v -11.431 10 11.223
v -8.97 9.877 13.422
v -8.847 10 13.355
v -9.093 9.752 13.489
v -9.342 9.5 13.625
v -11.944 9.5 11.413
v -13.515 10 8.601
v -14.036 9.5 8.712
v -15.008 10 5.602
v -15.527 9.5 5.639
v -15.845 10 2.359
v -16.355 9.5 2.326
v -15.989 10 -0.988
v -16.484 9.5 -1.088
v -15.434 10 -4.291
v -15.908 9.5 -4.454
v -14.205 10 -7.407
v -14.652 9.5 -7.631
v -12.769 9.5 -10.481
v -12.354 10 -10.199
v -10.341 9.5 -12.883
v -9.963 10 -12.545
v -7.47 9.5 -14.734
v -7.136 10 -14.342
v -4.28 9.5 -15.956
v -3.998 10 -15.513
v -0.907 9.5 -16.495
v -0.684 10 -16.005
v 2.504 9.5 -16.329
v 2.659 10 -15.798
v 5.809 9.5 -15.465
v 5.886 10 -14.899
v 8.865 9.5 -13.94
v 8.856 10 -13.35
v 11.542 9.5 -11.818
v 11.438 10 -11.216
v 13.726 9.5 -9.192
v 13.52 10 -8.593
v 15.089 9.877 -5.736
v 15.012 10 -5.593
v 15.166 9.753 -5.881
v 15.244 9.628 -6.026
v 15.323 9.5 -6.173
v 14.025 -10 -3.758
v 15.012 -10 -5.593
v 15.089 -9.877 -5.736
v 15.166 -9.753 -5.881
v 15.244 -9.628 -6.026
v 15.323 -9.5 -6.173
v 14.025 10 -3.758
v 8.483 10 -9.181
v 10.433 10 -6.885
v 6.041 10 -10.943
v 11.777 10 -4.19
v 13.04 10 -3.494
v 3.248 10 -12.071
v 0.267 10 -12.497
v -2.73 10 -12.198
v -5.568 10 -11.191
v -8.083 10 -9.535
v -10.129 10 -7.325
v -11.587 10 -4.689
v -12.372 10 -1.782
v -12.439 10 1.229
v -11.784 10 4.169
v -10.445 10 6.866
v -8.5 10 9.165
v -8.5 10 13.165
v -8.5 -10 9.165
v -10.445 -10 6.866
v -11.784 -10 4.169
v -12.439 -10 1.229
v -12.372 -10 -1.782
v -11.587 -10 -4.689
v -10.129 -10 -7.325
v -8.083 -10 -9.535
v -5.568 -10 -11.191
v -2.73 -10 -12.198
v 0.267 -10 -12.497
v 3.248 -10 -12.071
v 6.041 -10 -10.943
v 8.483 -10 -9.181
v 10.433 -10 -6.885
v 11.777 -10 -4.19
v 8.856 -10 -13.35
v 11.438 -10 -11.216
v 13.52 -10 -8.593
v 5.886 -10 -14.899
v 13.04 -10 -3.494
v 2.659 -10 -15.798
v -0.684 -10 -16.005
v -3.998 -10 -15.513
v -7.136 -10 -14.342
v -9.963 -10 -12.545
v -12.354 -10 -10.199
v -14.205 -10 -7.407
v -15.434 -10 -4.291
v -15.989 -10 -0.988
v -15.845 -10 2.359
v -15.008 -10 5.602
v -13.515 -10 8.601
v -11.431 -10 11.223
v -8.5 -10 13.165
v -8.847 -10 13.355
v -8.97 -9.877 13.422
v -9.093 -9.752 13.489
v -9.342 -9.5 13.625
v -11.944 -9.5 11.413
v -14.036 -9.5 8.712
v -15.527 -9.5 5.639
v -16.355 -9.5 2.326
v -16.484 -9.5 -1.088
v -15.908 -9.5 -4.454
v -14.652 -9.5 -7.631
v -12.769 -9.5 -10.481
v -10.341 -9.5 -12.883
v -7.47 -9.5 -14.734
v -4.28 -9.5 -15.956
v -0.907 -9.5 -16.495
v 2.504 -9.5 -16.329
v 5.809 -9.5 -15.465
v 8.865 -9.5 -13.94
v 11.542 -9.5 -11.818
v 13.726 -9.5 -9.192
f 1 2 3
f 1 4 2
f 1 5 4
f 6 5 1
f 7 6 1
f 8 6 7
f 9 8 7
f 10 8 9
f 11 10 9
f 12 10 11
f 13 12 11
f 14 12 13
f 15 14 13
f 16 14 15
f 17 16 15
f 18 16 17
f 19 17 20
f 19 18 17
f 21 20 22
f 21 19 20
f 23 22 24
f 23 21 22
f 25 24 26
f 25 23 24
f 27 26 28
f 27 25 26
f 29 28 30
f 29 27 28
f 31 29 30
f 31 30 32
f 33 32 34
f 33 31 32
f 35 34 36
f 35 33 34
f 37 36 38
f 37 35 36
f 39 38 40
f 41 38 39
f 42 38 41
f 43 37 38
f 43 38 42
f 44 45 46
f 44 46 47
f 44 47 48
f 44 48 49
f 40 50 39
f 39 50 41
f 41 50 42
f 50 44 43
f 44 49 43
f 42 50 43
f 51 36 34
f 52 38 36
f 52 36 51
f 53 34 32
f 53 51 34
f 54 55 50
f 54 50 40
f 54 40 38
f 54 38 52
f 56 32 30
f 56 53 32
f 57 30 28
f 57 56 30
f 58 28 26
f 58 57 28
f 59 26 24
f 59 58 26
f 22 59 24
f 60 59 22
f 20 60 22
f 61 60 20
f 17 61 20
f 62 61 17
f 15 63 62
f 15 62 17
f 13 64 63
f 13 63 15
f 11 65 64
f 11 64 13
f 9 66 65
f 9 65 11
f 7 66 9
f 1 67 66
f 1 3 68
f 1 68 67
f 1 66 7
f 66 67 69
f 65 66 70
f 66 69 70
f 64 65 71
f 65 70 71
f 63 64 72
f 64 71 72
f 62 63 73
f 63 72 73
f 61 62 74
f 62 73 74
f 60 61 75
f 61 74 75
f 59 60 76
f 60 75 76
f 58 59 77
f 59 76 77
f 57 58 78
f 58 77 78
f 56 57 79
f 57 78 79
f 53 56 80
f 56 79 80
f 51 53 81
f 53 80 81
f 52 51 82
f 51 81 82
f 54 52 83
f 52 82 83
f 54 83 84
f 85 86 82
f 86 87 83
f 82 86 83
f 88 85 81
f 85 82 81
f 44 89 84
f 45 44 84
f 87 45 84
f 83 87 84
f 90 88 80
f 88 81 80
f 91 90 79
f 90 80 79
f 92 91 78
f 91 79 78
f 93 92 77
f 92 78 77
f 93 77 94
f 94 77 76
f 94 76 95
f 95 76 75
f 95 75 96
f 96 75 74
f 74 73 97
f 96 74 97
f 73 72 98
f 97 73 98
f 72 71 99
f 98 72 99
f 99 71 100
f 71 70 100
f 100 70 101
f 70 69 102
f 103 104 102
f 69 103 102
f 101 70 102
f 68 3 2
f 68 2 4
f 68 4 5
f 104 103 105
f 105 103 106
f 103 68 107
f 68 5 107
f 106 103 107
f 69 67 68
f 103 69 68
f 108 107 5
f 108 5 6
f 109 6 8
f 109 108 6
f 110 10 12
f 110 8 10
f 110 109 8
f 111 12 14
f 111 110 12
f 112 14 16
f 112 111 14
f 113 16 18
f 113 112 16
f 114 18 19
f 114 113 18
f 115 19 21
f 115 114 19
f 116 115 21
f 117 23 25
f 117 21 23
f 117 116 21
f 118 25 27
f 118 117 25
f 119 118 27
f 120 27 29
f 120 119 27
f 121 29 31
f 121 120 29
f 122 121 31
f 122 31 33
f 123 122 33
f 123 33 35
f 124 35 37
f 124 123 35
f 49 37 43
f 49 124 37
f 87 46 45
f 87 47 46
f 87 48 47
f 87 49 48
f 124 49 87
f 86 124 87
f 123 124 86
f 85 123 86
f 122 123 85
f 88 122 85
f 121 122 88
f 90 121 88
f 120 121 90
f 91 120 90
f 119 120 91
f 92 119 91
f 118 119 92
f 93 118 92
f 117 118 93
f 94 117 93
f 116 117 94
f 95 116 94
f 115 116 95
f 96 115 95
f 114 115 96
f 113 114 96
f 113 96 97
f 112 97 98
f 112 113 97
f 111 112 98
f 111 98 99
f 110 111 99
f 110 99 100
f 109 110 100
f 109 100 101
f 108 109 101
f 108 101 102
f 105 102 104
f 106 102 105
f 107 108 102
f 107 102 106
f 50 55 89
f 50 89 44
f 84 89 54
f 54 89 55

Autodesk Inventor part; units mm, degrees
ref_plane "YZ Plane" through (0, 0, 0) normal (1, 0, 0) x (0, 1, 0)
ref_plane "XZ Plane" through (0, 0, 0) normal (0, 1, 0) x (-1, 0, 0)
ref_plane "XY Plane" through (0, 0, 0) normal (0, 0, 1) x (1, 0, 0)
sketch "Esquisse1" plane through (0, 0, 0) normal (0, 1, 0) x (-1, 0, 0)
  arc A0 (-8.5, 9.1652) -> (8.5, 9.1652) centre (0, 0) ccw
  line L0 (8.5, 9.1652) -> (8.5, 14.1652)
  line L1 (-8.5, 9.1652) -> (-8.5, 14.1652)
  arc A1 (-8.5, 14.1652) -> (8.5, 14.1652) centre (0, 0) ccw
  line L2 (-12.0741, -3.2352) -> (-15.9568, -4.2756)
  line L3 (23.1276, 0) -> (-23.1276, 0) projected
  point P0 (-14.1537, -8.5191)
  dimension "d0" = 12.5
  dimension "d1" = 5
  dimension "d2" = 17
  dimension "d11" = 15
extrude "Extrusion1" add sketch "Esquisse1" along normal mid plane 20 contours A0 L3 A1 L2 | A0 L0 A1 L3 picked at (15.0221, -1.3088)
chamfer "Chanfrein1" distance 1 angle 45 2 edges at (-8.5, 0, 14.1652) (12.0741, 0, -3.2352)
chamfer "Chanfrein2" distance 0.5 angle 45 2 edges at (-9.5419, 10, -13.4853) (-9.5419, -10, -13.4853)
chamfer "Chanfrein3" distance 2 angle 45 1 edges at (15.9568, 0, -4.2756)
properties part number "viseur_base"
